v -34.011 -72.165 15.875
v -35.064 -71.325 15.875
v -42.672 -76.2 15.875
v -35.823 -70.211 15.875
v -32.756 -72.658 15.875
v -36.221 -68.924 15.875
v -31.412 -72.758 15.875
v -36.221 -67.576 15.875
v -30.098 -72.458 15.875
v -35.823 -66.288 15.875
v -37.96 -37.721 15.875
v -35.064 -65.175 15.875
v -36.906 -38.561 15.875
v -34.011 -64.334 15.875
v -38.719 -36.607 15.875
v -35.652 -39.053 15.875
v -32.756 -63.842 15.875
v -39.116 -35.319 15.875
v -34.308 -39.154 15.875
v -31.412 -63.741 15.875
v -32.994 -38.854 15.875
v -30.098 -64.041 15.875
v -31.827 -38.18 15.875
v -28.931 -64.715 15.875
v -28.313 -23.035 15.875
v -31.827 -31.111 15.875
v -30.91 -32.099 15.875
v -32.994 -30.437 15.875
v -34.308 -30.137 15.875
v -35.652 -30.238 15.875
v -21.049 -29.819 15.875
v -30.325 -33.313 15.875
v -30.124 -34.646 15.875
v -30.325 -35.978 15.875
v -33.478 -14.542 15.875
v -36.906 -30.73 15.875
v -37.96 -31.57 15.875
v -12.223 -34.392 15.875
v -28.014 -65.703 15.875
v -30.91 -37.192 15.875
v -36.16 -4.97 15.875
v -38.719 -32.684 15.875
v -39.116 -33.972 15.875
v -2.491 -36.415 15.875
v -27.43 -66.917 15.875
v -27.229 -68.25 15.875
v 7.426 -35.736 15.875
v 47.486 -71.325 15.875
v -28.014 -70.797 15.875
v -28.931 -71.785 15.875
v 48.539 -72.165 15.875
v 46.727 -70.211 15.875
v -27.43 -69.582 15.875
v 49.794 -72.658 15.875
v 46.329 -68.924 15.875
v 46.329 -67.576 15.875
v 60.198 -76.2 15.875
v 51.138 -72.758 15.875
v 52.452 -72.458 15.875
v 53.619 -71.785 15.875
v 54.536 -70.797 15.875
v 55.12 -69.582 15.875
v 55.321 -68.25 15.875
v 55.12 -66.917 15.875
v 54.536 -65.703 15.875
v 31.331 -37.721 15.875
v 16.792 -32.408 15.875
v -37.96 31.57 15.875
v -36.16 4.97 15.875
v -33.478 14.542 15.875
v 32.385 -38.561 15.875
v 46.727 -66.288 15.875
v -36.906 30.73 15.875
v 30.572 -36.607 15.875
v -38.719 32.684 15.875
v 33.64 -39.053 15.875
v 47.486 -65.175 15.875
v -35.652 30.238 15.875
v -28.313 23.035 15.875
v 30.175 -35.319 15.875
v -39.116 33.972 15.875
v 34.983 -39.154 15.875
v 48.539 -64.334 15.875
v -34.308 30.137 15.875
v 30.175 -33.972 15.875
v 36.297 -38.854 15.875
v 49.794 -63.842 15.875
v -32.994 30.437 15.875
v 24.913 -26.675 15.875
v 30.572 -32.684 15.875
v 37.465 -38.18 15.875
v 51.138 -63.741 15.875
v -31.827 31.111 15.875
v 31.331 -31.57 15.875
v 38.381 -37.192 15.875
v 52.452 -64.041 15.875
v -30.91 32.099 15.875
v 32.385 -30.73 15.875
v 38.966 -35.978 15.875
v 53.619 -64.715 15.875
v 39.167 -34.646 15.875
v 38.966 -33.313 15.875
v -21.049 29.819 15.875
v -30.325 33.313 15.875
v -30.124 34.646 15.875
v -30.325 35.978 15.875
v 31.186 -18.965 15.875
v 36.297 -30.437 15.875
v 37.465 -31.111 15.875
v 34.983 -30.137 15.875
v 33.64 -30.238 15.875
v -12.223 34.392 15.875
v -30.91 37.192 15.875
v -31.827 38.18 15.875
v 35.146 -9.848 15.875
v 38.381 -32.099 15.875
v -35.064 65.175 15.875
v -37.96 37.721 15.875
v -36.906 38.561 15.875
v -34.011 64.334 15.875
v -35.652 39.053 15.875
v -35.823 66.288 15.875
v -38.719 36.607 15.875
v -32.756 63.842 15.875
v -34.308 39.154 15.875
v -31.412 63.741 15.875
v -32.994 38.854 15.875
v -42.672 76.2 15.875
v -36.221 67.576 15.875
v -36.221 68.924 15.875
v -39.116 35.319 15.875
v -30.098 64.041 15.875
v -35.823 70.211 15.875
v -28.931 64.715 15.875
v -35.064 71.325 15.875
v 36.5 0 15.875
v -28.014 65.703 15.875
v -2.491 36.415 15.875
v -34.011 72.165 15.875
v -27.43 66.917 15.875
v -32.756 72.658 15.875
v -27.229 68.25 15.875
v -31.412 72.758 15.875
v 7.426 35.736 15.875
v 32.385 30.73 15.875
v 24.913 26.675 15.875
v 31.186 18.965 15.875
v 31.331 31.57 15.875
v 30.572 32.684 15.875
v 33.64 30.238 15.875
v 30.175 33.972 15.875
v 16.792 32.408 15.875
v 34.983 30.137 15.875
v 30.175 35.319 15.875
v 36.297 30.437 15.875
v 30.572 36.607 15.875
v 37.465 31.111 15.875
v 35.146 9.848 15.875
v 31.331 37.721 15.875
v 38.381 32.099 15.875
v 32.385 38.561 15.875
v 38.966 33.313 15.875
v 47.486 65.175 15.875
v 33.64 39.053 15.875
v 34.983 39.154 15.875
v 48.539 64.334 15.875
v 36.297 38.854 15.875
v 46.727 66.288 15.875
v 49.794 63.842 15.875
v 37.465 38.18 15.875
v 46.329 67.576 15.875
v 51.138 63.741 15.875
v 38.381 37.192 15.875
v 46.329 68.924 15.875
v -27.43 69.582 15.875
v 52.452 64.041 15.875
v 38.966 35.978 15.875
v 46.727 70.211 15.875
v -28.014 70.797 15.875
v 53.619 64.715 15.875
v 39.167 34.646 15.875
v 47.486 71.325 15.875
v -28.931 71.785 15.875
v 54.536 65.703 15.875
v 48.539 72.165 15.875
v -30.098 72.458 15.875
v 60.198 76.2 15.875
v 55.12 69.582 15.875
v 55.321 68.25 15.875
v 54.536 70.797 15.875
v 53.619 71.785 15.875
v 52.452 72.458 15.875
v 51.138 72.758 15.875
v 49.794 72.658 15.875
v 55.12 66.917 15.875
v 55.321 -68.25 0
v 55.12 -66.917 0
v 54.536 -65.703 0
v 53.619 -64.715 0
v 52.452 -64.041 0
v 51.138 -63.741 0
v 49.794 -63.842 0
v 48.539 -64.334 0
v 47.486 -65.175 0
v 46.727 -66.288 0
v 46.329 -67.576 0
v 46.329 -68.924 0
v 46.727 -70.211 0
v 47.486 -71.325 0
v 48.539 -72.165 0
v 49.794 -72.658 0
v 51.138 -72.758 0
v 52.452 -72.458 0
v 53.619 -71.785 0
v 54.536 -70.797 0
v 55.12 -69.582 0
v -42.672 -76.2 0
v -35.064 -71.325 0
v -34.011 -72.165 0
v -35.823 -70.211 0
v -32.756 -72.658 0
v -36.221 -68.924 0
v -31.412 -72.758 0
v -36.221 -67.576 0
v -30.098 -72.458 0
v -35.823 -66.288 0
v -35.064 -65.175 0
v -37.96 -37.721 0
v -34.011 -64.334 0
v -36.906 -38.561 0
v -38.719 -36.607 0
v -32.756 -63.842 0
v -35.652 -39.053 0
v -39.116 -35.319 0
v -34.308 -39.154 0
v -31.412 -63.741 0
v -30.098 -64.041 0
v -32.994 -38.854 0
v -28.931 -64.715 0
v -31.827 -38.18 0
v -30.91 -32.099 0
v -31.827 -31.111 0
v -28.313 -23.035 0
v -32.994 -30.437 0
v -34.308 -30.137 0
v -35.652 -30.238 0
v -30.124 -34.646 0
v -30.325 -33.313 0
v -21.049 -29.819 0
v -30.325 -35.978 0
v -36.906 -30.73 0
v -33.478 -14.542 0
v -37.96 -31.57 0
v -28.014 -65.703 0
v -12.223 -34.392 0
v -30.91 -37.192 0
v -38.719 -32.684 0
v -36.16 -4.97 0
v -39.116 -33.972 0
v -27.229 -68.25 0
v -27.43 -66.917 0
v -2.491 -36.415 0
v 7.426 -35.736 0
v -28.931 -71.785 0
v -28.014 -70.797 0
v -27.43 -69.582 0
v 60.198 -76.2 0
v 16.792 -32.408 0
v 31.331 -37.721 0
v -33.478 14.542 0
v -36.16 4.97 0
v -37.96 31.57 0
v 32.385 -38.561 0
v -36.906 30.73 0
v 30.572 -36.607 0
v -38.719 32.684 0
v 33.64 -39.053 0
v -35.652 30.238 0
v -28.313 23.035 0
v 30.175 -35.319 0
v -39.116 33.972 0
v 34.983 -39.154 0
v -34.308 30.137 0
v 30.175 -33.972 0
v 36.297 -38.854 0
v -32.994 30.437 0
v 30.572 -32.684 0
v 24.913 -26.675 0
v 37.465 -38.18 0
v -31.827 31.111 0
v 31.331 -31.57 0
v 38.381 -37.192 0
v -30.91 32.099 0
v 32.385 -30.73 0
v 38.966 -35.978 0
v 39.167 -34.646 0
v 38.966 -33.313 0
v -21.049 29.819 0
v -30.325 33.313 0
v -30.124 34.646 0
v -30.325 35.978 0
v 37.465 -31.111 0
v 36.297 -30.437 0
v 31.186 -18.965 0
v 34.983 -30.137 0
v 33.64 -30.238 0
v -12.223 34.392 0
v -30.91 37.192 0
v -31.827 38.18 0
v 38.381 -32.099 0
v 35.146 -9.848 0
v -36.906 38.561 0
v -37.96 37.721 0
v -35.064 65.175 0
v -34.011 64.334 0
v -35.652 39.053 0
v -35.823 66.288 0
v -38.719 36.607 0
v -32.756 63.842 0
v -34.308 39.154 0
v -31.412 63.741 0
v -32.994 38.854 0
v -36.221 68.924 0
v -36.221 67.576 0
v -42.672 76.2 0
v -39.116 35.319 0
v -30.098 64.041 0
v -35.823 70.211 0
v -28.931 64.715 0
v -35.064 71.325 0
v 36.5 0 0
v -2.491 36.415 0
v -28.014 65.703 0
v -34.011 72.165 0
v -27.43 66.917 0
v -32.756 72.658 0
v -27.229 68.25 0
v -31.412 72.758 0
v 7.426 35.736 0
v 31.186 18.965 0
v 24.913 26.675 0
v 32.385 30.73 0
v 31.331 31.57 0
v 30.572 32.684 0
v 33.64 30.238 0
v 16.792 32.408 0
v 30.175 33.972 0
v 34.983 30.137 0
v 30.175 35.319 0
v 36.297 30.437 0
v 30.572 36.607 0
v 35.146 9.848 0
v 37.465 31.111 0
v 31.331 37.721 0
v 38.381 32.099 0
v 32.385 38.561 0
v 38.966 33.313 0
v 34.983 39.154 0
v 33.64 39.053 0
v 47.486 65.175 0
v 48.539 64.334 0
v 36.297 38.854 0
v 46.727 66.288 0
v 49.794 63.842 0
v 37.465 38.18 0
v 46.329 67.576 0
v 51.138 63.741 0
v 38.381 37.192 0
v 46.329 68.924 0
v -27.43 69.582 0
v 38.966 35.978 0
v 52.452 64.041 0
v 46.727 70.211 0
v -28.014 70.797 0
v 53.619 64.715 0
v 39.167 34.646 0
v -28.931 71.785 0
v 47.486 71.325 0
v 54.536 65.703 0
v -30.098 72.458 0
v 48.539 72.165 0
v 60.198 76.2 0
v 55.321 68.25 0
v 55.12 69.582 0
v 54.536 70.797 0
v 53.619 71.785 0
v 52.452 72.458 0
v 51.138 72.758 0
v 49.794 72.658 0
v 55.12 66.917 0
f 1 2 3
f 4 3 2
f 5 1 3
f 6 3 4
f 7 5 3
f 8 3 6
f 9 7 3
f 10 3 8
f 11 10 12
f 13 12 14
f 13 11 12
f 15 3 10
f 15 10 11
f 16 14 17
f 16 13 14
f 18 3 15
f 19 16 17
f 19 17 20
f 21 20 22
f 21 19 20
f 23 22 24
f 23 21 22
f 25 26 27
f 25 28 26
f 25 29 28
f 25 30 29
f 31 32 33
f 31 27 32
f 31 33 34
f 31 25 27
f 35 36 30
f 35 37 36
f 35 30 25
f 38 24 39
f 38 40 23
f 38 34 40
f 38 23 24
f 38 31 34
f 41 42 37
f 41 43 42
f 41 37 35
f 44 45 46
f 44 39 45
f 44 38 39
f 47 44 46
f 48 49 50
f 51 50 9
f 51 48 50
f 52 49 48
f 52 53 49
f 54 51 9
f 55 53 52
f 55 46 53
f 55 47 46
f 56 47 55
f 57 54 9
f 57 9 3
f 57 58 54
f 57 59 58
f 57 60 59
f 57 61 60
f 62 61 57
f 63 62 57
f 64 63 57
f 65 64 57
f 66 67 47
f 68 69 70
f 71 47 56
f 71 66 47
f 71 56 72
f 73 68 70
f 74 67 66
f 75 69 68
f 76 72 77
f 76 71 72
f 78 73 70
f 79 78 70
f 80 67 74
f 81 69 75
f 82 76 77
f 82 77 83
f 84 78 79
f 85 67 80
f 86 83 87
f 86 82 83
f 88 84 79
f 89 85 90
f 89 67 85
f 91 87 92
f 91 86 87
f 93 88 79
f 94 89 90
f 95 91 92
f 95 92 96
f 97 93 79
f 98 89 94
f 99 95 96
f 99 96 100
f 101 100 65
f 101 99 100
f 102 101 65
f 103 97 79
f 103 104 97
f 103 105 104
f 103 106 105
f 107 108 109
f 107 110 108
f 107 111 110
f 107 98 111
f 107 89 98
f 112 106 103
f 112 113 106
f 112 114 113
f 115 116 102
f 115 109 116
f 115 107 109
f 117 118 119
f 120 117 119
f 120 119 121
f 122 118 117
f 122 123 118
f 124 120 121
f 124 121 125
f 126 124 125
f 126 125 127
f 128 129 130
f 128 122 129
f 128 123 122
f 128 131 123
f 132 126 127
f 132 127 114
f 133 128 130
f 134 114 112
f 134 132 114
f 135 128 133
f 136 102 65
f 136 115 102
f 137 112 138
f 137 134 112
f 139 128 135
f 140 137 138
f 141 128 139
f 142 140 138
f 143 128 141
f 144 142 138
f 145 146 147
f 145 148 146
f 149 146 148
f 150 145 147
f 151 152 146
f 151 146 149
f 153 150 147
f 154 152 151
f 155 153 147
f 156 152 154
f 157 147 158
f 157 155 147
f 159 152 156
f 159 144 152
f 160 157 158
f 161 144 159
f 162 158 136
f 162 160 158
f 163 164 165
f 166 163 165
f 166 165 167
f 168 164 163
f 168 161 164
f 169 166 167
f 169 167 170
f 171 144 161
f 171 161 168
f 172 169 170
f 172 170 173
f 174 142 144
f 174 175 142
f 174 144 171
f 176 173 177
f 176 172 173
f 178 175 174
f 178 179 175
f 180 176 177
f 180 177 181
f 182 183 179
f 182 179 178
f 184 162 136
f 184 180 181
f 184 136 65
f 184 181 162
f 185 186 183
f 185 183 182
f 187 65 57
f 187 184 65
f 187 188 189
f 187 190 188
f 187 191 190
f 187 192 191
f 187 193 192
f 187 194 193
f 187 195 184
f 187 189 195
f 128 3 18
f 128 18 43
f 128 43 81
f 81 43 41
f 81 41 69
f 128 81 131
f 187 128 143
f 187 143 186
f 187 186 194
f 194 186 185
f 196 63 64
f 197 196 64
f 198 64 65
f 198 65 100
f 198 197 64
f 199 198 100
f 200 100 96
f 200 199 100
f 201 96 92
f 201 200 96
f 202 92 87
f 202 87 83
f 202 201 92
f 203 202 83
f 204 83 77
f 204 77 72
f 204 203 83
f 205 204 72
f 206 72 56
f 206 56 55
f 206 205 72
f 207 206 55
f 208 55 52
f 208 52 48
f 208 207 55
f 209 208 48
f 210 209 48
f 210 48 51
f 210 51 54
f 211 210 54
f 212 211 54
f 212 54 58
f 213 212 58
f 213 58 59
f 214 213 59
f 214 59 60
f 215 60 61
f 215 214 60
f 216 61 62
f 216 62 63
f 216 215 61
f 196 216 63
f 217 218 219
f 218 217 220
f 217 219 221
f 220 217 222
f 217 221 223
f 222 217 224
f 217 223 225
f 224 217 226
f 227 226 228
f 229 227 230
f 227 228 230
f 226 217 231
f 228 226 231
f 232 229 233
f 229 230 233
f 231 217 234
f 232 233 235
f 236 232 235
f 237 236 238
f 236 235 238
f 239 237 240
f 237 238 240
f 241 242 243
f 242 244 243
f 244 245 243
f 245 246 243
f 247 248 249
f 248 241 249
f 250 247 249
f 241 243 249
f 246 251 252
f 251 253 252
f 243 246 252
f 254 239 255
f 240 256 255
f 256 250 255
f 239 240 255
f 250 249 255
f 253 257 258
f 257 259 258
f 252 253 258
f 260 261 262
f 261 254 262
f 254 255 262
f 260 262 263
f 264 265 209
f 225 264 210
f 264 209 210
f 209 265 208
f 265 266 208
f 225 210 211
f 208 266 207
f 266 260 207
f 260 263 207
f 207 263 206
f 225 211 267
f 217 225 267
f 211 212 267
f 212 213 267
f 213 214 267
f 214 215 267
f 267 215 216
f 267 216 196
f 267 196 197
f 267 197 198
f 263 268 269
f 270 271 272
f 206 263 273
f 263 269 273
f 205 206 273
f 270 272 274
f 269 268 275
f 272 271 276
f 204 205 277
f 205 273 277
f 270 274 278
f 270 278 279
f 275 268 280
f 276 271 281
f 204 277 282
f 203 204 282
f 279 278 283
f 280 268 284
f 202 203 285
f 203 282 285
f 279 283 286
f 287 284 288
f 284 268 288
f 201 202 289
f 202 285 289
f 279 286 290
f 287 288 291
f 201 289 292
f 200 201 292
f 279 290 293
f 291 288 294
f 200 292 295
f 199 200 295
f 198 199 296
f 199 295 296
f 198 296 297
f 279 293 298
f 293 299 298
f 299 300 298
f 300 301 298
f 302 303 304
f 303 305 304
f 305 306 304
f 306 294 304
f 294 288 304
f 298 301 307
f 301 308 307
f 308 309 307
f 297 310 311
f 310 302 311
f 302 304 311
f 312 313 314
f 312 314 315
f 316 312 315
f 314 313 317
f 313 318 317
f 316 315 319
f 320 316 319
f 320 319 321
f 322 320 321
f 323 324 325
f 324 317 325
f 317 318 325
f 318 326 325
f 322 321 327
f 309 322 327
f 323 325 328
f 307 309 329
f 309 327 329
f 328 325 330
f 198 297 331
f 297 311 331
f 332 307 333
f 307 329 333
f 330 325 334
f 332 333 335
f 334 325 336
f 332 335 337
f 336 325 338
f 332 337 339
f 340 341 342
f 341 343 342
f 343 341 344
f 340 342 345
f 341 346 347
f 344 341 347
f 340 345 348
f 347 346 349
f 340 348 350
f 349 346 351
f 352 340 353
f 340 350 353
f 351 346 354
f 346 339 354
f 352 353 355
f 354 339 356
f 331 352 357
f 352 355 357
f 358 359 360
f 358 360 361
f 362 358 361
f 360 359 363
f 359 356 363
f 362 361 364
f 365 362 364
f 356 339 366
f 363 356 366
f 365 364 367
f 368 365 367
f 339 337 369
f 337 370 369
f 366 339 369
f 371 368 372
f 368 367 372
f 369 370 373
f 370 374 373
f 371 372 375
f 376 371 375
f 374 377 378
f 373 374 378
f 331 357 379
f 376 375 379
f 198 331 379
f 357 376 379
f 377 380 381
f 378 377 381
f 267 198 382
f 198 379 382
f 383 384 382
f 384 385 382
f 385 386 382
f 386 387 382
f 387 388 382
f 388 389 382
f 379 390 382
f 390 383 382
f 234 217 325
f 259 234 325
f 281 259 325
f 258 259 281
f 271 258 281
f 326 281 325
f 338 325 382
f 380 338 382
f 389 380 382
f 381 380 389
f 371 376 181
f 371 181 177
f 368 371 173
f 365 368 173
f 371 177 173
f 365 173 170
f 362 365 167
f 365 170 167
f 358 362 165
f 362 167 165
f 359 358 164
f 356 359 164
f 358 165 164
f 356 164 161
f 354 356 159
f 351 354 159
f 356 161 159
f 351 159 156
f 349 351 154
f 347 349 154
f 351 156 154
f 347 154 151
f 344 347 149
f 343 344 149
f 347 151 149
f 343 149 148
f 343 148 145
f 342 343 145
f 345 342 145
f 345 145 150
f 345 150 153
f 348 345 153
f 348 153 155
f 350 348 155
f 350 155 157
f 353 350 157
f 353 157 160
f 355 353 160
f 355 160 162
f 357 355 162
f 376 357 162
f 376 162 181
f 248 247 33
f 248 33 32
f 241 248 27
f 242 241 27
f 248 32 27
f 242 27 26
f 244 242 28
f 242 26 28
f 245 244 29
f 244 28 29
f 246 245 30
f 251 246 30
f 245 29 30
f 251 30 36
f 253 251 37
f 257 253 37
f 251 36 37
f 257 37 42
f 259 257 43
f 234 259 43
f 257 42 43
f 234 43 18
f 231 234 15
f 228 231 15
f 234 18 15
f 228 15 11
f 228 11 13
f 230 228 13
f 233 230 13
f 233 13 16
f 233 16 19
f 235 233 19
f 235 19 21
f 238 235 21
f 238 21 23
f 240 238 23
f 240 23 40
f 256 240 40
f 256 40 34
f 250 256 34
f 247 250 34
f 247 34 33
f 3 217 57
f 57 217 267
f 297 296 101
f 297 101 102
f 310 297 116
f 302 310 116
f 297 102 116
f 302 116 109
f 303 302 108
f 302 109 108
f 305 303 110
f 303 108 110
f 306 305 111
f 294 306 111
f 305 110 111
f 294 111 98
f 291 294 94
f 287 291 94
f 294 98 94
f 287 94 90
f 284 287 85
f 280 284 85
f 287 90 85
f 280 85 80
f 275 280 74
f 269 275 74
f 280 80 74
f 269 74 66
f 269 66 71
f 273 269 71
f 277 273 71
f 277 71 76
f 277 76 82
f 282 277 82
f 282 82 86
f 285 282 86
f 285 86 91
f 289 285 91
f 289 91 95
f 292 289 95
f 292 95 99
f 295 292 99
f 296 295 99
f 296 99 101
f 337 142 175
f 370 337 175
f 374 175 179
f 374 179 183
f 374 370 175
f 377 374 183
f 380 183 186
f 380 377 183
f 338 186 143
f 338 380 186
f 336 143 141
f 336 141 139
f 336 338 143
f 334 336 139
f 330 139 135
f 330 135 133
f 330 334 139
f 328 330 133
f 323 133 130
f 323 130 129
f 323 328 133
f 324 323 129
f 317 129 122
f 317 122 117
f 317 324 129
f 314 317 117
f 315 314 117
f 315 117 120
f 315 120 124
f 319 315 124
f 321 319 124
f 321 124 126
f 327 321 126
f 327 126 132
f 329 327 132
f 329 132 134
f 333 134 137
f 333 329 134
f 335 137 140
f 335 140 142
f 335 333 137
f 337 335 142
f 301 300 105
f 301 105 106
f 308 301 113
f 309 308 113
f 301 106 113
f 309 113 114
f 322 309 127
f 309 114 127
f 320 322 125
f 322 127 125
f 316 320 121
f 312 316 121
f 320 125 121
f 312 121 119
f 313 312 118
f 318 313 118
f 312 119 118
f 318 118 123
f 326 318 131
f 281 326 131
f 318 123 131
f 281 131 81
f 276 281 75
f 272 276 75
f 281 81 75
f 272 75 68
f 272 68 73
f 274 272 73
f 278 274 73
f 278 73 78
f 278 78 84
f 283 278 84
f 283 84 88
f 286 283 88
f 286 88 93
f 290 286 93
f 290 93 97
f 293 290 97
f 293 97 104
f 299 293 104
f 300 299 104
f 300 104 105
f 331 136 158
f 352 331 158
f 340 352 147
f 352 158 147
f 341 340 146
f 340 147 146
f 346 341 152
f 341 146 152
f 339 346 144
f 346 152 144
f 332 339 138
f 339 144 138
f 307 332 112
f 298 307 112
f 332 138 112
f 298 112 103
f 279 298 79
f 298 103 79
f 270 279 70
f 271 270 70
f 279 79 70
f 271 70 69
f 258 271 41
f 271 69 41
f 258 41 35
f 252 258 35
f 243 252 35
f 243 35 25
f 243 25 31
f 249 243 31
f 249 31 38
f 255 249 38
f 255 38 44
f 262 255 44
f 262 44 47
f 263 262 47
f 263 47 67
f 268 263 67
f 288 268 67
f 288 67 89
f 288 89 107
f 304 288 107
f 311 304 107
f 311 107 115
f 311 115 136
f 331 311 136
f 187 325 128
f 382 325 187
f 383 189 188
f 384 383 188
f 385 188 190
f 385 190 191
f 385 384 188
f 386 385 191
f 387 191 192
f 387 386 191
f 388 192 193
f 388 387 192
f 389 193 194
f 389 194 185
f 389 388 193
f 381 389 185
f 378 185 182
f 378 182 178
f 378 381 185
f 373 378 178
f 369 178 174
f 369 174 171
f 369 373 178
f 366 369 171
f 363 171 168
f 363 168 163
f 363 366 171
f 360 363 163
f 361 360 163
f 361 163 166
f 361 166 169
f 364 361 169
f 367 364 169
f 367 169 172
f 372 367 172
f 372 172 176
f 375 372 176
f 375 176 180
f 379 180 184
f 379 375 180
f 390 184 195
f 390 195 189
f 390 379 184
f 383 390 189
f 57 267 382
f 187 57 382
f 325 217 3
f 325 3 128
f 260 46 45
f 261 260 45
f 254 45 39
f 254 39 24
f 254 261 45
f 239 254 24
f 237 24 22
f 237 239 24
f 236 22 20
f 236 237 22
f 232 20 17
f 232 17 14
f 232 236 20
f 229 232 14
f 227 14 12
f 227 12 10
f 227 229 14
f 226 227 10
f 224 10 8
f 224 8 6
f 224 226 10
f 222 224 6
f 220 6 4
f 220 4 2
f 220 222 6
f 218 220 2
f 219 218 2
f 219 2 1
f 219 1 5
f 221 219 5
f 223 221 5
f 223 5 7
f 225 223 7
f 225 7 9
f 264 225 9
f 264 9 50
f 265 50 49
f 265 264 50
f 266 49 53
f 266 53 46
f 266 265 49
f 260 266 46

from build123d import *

# Parameters (mm, degrees)
F0_W     = 102.87
F0_H     = 152.4
F0_R     = 4.5212
F1_DEPTH = 15.875
F2_DEPTH = 197
F3_R     = 36.4998
F4_DEPTH = 15.876
F5_R     = 4.5212
F6_DEPTH = 15.876


# Not quite as in the source:
# - an extrude ends at something that could not be found from the text; its depth is read off the source's solid


with BuildPart() as f1:
    # F0 (on Top) → F1 (new body)
    with BuildSketch(Plane.XY):
        with Locations((8.763, 0)):
            Rectangle(F0_W, F0_H)
        with Locations((-31.75, -68.2498)):
            Circle(F0_R, mode=Mode.SUBTRACT)
        with Locations((50.8, -68.2498)):
            Circle(F0_R, mode=Mode.SUBTRACT)
        with Locations((-31.75, 68.2498)):
            Circle(F0_R, mode=Mode.SUBTRACT)
        with Locations((50.8, 68.2498)):
            Circle(F0_R, mode=Mode.SUBTRACT)
    extrude(amount=F1_DEPTH)

    # F0 (on Top) → F2 (cut, through all)
    with BuildSketch(Plane.XY):
        with Locations((8.763, 0)):
            Rectangle(F0_W, F0_H)
        with Locations((-31.75, -68.2498)):
            Circle(F0_R, mode=Mode.SUBTRACT)
        with Locations((50.8, -68.2498)):
            Circle(F0_R, mode=Mode.SUBTRACT)
        with Locations((-31.75, 68.2498)):
            Circle(F0_R, mode=Mode.SUBTRACT)
        with Locations((50.8, 68.2498)):
            Circle(F0_R, mode=Mode.SUBTRACT)
    extrude(amount=-F2_DEPTH, mode=Mode.SUBTRACT)

    # F3 (on face) → F4 (cut, through all)
    with BuildSketch(Plane.XY.offset(15.875)):
        Circle(F3_R)
    extrude(amount=-F4_DEPTH, mode=Mode.SUBTRACT)

    # F5 (on face) → F6 (cut, through all)
    with BuildSketch(Plane.XY.offset(15.875)):
        with Locations((-34.6456, 34.6456)):
            Circle(F5_R)
        with Locations((34.6456, 34.6456)):
            Circle(F5_R)
        with Locations((34.6456, -34.6456)):
            Circle(F5_R)
        with Locations((-34.6456, -34.6456)):
            Circle(F5_R)
    extrude(amount=-F6_DEPTH, mode=Mode.SUBTRACT)


solid = f1.part
